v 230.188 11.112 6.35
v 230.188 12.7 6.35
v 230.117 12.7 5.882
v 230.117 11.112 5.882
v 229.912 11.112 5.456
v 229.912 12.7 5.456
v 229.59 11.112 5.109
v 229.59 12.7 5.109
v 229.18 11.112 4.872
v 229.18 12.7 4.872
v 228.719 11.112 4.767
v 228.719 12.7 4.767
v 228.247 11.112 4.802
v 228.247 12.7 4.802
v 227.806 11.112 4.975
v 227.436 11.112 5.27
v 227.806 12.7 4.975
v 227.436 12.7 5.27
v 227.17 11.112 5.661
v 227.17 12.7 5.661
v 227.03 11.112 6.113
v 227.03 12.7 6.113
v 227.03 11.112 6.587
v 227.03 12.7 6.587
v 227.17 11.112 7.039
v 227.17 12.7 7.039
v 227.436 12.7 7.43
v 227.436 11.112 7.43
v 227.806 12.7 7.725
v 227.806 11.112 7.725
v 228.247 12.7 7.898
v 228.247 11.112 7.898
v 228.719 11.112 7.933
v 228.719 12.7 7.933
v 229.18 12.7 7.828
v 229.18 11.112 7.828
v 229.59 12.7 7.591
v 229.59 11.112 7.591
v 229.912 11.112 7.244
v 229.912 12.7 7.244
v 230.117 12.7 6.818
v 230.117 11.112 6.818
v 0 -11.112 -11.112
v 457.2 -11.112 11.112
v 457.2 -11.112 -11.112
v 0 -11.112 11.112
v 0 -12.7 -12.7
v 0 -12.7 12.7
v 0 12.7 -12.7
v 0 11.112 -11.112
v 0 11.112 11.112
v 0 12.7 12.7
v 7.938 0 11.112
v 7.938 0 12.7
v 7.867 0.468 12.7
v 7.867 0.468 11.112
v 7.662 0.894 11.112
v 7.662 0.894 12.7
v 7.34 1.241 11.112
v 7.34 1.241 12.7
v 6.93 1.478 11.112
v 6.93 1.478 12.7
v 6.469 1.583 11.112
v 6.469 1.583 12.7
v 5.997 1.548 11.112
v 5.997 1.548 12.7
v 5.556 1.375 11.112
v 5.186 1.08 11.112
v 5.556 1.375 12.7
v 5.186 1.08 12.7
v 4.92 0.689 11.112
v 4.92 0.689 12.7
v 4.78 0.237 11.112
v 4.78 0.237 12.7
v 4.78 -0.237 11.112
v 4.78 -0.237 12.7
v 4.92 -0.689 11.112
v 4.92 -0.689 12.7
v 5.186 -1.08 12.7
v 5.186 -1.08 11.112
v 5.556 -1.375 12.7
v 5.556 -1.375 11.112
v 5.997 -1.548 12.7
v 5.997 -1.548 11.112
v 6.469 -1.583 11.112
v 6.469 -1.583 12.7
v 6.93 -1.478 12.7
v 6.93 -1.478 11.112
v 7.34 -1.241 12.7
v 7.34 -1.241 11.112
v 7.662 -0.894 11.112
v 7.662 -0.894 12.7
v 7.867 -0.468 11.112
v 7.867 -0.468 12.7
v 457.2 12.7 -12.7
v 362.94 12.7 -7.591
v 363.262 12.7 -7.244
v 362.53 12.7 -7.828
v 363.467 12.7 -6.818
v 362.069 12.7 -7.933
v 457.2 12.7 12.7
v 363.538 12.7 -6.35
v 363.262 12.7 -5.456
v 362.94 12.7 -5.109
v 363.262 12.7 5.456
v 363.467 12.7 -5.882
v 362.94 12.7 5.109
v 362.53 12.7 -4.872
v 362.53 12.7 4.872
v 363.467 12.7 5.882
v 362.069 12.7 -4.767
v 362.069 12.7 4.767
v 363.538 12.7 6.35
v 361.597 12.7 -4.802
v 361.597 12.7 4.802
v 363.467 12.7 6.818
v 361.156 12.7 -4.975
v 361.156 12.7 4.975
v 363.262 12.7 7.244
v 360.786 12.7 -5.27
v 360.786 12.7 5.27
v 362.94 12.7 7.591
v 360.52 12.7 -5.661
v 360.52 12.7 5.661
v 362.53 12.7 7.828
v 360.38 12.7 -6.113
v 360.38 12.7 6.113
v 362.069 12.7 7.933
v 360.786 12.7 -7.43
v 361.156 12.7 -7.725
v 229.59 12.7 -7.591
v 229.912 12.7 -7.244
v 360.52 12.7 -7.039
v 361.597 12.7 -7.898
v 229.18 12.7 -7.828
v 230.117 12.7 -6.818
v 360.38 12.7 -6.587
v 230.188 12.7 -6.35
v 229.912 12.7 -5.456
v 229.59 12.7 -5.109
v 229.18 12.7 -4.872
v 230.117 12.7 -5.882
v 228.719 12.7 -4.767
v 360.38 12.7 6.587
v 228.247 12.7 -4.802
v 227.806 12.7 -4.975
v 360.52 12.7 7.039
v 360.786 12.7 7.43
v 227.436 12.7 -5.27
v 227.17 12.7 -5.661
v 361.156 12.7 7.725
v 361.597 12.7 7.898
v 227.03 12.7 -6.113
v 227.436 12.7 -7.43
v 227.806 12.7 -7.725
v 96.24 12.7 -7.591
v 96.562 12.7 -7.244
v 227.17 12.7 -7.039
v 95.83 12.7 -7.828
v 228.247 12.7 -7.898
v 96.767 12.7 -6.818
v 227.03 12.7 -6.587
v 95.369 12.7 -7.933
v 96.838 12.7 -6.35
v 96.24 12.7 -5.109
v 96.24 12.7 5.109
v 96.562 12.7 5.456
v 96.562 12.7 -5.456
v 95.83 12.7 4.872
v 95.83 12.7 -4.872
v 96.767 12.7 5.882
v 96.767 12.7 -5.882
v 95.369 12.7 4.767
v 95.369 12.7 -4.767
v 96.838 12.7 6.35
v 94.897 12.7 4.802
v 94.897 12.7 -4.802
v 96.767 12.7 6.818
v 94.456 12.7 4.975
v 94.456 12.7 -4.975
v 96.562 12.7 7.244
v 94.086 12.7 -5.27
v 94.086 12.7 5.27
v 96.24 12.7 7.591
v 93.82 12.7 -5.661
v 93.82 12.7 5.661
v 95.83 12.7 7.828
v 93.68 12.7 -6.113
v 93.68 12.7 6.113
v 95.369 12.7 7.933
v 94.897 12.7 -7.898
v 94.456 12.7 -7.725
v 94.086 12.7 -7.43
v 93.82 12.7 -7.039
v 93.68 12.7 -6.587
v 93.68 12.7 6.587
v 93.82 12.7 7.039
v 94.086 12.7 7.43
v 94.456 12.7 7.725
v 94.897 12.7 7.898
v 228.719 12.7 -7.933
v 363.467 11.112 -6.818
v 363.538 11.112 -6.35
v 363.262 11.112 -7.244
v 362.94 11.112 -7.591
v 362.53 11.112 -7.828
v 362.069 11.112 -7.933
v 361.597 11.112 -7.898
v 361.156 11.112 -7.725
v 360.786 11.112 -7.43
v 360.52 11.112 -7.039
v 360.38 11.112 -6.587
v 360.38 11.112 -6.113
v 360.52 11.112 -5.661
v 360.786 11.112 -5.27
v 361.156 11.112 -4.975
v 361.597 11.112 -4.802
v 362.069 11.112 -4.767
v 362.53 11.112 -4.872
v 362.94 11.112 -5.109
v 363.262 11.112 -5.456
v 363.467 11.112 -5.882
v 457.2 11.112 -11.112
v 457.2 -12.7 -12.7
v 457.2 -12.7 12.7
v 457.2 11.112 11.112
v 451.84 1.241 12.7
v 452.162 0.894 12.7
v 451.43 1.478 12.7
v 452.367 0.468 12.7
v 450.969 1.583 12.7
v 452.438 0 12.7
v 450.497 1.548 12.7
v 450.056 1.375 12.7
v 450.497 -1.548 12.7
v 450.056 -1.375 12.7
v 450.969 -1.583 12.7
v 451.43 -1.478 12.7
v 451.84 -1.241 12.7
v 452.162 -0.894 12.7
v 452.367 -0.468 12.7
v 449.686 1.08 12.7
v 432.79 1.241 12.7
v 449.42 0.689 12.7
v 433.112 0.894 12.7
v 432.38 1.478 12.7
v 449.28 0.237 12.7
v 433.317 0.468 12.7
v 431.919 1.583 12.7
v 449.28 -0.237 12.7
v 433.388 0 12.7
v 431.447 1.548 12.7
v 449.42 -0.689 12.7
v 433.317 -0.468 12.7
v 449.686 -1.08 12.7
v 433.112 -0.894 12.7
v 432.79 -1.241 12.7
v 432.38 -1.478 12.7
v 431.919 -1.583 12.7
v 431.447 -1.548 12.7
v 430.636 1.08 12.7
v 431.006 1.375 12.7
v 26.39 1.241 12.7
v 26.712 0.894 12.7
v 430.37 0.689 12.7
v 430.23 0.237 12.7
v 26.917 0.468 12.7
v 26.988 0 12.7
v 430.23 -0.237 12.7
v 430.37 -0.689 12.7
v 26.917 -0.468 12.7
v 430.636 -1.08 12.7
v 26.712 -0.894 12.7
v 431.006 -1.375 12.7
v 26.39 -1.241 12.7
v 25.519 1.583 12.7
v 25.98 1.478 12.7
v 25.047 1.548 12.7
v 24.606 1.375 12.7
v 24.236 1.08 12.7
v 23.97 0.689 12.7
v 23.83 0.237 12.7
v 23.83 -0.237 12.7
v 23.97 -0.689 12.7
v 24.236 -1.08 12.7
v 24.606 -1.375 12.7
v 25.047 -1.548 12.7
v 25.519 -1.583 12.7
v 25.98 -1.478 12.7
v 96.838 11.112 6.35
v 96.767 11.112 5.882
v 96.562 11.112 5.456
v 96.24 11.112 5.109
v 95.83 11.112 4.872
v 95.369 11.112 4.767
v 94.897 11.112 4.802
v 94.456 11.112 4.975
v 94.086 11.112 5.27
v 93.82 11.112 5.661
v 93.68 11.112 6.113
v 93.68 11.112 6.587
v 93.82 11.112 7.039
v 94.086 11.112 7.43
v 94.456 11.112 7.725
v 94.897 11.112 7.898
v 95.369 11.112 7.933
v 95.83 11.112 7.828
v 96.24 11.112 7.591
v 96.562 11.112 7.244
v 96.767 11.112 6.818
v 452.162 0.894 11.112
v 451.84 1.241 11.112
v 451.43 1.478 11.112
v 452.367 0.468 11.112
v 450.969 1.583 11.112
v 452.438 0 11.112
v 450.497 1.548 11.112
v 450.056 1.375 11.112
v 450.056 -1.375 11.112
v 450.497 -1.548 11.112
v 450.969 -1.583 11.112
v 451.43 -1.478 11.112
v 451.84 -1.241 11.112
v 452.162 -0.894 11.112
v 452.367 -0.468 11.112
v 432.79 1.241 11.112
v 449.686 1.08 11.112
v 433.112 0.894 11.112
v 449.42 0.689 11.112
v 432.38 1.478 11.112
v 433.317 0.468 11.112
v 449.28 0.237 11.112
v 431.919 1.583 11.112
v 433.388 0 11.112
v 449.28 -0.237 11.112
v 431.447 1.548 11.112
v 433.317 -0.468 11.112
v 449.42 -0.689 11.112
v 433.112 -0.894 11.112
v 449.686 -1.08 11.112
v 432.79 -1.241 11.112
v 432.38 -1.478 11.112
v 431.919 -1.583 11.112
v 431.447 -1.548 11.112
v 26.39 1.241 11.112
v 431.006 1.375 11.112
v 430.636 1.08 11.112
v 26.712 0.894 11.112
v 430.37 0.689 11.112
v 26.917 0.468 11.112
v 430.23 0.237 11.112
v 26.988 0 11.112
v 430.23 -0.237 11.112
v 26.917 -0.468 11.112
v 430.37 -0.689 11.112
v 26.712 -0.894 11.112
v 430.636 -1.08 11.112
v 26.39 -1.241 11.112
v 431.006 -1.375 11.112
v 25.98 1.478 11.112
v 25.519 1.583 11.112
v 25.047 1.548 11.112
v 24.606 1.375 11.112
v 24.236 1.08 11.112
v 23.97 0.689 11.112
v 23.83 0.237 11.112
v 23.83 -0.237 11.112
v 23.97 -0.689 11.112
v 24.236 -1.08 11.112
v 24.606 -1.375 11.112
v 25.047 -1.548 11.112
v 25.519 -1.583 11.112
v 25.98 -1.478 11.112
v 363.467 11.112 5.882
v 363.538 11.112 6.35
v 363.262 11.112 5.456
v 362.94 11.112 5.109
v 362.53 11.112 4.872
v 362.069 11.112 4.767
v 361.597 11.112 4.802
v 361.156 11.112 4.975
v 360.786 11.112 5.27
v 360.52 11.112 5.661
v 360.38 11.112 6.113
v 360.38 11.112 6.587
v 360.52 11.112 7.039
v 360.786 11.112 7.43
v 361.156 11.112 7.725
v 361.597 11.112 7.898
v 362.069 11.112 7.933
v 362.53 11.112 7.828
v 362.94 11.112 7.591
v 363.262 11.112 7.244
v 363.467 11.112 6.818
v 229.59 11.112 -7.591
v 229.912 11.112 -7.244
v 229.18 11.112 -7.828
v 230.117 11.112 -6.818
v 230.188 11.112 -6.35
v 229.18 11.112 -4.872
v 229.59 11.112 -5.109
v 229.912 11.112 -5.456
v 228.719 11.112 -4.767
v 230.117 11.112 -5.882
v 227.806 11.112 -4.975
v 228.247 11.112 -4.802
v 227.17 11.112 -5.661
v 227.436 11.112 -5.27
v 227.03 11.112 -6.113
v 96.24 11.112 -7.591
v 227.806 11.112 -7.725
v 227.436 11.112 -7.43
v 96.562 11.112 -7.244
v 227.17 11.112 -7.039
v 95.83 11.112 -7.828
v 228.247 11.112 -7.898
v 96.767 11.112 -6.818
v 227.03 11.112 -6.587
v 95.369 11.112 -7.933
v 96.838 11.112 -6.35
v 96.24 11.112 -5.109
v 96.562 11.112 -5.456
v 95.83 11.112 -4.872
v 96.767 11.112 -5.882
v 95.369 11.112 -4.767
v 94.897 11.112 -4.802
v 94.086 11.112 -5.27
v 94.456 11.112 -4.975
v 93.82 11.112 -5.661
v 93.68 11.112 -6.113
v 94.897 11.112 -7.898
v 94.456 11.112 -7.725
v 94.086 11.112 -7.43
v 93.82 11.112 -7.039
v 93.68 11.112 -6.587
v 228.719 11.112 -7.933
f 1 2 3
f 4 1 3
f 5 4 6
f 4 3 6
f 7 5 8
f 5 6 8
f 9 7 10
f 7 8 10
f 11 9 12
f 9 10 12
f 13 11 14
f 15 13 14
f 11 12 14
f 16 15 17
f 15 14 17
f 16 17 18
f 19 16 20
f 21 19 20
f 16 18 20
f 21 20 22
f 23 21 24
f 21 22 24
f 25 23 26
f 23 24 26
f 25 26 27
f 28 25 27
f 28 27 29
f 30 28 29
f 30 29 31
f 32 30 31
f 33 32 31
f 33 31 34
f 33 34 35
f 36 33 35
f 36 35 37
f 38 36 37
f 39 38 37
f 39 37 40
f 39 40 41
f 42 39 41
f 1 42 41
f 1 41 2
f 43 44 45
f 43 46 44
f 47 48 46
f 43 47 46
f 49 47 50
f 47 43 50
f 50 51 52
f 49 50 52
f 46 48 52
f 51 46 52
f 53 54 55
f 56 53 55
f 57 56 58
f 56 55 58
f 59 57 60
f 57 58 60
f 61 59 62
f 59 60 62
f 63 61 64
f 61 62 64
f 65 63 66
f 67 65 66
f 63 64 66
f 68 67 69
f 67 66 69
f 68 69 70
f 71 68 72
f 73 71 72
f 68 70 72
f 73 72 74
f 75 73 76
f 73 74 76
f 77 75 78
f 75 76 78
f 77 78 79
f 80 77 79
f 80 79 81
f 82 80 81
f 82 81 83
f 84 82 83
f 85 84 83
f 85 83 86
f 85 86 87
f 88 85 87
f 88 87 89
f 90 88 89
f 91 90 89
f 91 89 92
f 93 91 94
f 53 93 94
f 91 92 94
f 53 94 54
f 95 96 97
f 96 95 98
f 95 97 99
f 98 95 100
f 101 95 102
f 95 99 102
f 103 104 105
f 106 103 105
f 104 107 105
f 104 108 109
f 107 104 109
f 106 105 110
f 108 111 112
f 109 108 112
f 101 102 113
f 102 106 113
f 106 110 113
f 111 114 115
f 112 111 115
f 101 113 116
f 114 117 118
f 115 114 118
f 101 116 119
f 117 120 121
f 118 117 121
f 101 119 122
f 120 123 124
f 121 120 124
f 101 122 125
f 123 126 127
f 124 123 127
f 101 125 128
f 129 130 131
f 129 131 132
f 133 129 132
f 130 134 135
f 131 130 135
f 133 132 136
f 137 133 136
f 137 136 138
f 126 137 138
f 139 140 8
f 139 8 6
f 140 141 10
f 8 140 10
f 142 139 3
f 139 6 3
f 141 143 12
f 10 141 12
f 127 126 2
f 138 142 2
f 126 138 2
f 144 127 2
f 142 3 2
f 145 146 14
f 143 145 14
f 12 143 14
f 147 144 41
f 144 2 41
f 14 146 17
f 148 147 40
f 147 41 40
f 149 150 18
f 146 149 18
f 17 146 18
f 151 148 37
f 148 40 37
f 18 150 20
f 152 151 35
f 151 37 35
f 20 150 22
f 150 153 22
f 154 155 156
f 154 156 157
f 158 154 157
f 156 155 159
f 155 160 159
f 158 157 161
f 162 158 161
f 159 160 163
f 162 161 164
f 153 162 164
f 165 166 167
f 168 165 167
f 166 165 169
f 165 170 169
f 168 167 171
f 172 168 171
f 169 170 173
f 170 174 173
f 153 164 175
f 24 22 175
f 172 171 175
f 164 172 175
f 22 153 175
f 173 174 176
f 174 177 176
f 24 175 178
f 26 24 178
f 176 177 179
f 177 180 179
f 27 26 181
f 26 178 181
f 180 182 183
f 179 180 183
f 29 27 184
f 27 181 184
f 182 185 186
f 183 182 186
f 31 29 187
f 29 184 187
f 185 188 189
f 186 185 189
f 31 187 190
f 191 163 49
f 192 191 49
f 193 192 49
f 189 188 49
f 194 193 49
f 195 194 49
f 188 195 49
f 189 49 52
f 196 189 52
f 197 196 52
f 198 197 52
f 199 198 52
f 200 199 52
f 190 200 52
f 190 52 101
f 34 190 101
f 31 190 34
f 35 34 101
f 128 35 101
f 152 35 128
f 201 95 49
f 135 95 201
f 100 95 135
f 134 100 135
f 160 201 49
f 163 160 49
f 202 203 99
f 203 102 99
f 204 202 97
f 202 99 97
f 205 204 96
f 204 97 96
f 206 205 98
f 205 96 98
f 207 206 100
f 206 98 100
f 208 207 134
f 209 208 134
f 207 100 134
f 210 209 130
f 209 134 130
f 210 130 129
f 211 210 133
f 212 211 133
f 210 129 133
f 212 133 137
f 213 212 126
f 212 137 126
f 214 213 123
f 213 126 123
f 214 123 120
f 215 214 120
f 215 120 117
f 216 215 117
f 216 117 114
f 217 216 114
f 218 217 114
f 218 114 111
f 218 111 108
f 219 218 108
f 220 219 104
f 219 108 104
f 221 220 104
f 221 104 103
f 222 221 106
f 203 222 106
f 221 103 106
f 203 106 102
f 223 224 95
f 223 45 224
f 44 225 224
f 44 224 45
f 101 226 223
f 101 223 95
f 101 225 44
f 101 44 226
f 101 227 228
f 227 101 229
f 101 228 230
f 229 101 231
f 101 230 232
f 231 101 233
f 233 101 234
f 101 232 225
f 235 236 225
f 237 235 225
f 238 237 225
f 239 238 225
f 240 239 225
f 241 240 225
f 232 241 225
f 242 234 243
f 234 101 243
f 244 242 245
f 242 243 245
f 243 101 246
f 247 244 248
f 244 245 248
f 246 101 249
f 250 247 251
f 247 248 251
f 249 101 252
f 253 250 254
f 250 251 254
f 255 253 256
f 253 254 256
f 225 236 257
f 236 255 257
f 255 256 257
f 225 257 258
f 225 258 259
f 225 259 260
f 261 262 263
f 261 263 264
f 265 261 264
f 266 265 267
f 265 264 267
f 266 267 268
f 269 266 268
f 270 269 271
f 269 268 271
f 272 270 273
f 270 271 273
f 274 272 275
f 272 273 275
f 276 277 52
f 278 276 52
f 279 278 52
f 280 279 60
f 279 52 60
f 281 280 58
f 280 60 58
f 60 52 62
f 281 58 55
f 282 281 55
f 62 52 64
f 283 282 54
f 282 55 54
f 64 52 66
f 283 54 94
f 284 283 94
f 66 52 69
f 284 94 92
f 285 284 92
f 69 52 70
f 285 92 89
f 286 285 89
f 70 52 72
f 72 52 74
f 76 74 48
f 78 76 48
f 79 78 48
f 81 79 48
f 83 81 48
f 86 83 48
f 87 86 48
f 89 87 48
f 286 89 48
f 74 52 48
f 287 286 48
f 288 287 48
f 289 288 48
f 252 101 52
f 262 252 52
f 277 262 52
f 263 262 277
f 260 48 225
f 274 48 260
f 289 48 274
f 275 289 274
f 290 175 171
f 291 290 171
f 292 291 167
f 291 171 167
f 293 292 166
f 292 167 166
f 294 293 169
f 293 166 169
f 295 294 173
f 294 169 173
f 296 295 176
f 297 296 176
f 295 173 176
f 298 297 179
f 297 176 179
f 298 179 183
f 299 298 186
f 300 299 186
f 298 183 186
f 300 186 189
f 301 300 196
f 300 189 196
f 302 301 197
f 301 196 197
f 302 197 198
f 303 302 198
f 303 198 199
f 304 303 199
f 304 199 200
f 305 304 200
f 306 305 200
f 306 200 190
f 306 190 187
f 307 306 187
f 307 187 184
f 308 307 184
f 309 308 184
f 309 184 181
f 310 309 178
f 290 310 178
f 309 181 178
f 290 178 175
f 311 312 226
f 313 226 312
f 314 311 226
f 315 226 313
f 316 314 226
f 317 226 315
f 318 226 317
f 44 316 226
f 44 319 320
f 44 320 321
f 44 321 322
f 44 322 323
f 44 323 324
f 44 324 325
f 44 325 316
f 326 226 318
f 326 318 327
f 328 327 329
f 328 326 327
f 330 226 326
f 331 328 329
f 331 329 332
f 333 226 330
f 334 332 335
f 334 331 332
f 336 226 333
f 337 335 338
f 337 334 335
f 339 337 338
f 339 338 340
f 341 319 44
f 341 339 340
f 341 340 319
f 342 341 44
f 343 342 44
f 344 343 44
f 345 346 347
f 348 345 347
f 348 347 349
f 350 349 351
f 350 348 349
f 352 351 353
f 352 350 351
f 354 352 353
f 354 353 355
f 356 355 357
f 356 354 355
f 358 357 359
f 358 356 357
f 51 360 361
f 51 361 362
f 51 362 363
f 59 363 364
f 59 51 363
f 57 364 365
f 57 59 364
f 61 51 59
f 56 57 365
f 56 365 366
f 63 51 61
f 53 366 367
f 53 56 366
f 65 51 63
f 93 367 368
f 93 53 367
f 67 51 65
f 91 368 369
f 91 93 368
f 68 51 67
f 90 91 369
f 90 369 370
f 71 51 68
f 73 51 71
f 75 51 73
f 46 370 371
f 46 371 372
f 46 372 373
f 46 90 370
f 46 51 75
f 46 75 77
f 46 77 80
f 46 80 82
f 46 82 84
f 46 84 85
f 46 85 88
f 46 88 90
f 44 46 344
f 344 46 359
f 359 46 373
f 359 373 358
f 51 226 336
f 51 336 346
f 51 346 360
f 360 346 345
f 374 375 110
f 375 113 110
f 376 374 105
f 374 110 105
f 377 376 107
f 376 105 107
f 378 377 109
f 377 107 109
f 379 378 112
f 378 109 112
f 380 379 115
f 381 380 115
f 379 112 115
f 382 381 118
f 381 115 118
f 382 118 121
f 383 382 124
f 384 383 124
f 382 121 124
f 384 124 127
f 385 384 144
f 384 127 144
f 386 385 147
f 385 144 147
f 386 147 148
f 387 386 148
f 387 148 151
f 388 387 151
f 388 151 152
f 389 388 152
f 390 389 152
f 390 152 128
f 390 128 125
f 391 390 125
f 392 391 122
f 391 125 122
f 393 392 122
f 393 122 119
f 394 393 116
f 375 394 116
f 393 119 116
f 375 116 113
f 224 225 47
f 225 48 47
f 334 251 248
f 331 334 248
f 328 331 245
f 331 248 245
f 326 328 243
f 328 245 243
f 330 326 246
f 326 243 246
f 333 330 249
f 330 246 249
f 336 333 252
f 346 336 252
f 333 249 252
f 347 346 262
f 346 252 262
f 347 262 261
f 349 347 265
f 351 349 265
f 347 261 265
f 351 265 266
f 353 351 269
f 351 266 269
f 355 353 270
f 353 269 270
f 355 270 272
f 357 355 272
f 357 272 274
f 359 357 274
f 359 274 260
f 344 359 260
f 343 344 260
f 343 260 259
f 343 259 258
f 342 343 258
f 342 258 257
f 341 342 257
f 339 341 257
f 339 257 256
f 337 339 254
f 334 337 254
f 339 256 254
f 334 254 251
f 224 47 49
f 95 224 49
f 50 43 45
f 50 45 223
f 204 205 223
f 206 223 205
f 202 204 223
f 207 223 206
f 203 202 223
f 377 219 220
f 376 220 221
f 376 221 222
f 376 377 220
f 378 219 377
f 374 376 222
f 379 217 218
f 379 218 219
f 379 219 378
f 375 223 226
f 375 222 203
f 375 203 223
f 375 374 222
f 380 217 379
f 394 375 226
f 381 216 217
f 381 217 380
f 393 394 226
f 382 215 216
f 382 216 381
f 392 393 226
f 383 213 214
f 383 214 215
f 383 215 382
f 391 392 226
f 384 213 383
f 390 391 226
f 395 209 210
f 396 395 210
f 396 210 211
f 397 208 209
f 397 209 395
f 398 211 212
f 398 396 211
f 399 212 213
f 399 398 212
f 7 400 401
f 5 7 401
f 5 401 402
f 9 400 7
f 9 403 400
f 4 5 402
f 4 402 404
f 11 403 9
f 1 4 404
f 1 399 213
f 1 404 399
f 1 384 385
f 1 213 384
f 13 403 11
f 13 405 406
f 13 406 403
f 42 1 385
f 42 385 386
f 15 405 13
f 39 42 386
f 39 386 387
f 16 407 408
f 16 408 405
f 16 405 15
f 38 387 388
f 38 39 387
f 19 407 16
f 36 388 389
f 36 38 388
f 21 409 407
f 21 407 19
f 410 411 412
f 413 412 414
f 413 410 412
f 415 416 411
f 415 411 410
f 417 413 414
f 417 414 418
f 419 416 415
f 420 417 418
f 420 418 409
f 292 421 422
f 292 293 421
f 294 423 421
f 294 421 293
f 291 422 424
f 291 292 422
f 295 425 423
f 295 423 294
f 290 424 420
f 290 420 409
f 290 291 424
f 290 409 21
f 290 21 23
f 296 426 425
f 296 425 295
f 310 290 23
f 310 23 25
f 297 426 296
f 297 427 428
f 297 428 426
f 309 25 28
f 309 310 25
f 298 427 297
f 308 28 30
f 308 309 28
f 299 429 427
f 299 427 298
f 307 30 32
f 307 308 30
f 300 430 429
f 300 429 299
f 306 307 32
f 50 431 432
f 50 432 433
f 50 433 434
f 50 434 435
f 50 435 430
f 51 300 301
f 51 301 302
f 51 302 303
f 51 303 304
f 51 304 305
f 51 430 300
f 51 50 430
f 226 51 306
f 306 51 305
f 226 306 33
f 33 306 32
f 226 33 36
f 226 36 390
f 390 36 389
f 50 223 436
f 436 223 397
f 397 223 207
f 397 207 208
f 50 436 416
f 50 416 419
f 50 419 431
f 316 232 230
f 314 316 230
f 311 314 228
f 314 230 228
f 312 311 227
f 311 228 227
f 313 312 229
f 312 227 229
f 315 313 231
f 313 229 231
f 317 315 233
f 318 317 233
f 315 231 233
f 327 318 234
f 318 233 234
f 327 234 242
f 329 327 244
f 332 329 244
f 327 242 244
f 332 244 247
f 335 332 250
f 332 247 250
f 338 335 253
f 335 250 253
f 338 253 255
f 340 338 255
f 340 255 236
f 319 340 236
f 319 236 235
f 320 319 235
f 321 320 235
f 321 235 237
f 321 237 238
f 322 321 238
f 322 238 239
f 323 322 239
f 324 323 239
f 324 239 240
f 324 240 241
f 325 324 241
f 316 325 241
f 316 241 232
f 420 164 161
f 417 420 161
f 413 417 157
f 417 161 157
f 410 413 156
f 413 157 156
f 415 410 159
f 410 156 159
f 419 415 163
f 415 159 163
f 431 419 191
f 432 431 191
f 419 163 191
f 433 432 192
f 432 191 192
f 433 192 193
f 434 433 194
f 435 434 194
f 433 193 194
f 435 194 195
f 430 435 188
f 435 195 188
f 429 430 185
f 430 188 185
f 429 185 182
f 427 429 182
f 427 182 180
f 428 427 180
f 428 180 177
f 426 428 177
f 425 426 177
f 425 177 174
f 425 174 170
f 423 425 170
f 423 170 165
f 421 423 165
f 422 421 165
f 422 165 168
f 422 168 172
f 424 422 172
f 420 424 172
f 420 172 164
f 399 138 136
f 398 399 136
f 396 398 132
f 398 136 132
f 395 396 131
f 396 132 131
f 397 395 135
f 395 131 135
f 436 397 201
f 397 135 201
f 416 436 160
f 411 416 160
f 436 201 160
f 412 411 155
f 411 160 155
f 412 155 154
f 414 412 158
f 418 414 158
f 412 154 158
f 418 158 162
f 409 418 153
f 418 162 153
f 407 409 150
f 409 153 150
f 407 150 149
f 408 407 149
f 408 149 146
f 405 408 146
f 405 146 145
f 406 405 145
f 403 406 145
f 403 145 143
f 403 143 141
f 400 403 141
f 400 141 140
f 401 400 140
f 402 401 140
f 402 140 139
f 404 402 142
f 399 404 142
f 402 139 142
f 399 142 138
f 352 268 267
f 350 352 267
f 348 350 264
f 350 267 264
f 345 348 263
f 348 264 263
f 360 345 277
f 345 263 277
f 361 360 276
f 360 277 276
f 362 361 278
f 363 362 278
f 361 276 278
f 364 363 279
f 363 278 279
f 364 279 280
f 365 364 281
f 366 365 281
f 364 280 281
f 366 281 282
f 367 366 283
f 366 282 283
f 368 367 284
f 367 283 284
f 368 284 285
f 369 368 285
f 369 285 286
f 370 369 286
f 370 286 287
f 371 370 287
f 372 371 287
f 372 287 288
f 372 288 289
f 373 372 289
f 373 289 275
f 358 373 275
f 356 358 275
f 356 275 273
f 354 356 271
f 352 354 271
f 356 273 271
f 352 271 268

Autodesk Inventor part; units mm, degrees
ref_plane "YZ Plane" through (0, 0, 0) normal (1, 0, 0) x (0, 1, 0)
ref_plane "XZ Plane" through (0, 0, 0) normal (0, 1, 0) x (-1, 0, 0)
ref_plane "XY Plane" through (0, 0, 0) normal (0, 0, 1) x (1, 0, 0)
sketch "Sketch1" plane through (0, 0, 0) normal (1, 0, 0) x (0, 1, 0)
  line L0 (11.1125, 11.1125) -> (-11.1125, 11.1125)
  line L1 (-11.1125, 11.1125) -> (-11.1125, -11.1125)
  line L2 (-11.1125, -11.1125) -> (11.1125, -11.1125)
  line L3 (11.1125, -11.1125) -> (11.1125, 11.1125)
  line L4 (12.7, 12.7) -> (-12.7, 12.7)
  line L5 (-12.7, 12.7) -> (-12.7, -12.7)
  line L6 (-12.7, -12.7) -> (12.7, -12.7)
  line L7 (12.7, -12.7) -> (12.7, 12.7)
  line L8 (0, 11.1125) -> (0, 12.7) construction
  line L9 (11.1125, 0) -> (12.7, 0) construction
  line L10 (11.1125, 0) -> (0, 0) construction
  line L11 (0, 0) -> (0, 11.1125) construction
  dimension "d0" = 25.4
  dimension "d1" = 1.5875
extrude "Extrusion1" add sketch "Sketch1" along normal blind 457.2
sketch "Sketch2" plane through (0, -12.7, 12.7) normal (0, 0, 1) x (1, 0, 0)
  line L0 (0, 12.7) -> (457.2, 12.7) construction
  line L1 (457.2, 1.5875) -> (457.2, 23.8125) construction
  circle A0 centre (450.85, 12.7) radius 1.5875
  circle A1 centre (431.8, 12.7) radius 1.5875
  line L2 (228.6, 12.7) -> (228.6, 1.5875) construction
  circle A2 centre (6.35, 12.7) radius 1.5875
  circle A3 centre (25.4, 12.7) radius 1.5875
  dimension "d4" = 6.35
  dimension "d5" = 19.05
  dimension "d6" = 3.175
extrude "Extrusion2" cut sketch "Sketch2" against normal up to next
sketch "Sketch3" plane through (0, 12.7, 12.7) normal (0, 1, 0) x (1, 0, 0)
  line L0 (0, 0) -> (457.2, 0) construction
  line L1 (228.6, 0) -> (228.6, 42.8948) construction
  line L2 (361.95, 0) -> (361.95, 36.7793) construction
  circle A0 centre (361.95, 6.35) radius 1.5875
  circle A1 centre (361.95, 19.05) radius 1.5875
  circle A2 centre (95.25, 6.35) radius 1.5875
  circle A3 centre (95.25, 19.05) radius 1.5875
  circle A4 centre (228.6, 19.05) radius 1.5875
  circle A5 centre (228.6, 6.35) radius 1.5875
  line L3 (361.95, 19.05) -> (228.6, 19.05) construction
  line L4 (0, 23.8125) -> (457.2, 23.8125) construction
  line L5 (361.95, 6.35) -> (228.6, 6.35) construction
  point P0 (0, 12.7)
  dimension "d9" = 3.175
  dimension "d10" = 6.35
  dimension "d11" = 12.7
  dimension "d15" = 266.7
extrude "Extrusion3" cut sketch "Sketch3" against normal up to next
properties part number "Cross Brace"
